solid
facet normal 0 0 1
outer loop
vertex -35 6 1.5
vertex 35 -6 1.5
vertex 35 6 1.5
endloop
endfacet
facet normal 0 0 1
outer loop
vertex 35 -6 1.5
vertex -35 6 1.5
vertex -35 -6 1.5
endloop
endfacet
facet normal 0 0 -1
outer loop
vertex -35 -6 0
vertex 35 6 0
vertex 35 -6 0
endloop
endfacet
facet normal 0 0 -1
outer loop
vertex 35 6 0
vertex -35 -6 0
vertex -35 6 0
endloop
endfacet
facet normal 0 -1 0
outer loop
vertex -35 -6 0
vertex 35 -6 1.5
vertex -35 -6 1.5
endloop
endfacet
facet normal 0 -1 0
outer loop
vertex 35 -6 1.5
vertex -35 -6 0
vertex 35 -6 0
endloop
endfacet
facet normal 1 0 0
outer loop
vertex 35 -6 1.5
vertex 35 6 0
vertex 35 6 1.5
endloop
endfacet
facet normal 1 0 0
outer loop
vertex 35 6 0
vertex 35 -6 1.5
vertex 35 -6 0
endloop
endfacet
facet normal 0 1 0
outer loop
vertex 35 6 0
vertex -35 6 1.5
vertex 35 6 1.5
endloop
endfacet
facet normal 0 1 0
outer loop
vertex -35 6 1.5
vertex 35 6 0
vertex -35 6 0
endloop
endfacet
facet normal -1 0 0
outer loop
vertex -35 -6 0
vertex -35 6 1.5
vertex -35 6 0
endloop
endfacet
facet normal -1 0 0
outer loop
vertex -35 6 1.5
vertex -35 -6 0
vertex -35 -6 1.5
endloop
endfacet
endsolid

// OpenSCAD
// Built by bench/smallmodels/features/compiler.py from a list of features.
$fn = 64;
union() {
    translate([0, 0, 0]) translate([-35, -6, 0]) cube([70, 12, 1.5]);
  }
